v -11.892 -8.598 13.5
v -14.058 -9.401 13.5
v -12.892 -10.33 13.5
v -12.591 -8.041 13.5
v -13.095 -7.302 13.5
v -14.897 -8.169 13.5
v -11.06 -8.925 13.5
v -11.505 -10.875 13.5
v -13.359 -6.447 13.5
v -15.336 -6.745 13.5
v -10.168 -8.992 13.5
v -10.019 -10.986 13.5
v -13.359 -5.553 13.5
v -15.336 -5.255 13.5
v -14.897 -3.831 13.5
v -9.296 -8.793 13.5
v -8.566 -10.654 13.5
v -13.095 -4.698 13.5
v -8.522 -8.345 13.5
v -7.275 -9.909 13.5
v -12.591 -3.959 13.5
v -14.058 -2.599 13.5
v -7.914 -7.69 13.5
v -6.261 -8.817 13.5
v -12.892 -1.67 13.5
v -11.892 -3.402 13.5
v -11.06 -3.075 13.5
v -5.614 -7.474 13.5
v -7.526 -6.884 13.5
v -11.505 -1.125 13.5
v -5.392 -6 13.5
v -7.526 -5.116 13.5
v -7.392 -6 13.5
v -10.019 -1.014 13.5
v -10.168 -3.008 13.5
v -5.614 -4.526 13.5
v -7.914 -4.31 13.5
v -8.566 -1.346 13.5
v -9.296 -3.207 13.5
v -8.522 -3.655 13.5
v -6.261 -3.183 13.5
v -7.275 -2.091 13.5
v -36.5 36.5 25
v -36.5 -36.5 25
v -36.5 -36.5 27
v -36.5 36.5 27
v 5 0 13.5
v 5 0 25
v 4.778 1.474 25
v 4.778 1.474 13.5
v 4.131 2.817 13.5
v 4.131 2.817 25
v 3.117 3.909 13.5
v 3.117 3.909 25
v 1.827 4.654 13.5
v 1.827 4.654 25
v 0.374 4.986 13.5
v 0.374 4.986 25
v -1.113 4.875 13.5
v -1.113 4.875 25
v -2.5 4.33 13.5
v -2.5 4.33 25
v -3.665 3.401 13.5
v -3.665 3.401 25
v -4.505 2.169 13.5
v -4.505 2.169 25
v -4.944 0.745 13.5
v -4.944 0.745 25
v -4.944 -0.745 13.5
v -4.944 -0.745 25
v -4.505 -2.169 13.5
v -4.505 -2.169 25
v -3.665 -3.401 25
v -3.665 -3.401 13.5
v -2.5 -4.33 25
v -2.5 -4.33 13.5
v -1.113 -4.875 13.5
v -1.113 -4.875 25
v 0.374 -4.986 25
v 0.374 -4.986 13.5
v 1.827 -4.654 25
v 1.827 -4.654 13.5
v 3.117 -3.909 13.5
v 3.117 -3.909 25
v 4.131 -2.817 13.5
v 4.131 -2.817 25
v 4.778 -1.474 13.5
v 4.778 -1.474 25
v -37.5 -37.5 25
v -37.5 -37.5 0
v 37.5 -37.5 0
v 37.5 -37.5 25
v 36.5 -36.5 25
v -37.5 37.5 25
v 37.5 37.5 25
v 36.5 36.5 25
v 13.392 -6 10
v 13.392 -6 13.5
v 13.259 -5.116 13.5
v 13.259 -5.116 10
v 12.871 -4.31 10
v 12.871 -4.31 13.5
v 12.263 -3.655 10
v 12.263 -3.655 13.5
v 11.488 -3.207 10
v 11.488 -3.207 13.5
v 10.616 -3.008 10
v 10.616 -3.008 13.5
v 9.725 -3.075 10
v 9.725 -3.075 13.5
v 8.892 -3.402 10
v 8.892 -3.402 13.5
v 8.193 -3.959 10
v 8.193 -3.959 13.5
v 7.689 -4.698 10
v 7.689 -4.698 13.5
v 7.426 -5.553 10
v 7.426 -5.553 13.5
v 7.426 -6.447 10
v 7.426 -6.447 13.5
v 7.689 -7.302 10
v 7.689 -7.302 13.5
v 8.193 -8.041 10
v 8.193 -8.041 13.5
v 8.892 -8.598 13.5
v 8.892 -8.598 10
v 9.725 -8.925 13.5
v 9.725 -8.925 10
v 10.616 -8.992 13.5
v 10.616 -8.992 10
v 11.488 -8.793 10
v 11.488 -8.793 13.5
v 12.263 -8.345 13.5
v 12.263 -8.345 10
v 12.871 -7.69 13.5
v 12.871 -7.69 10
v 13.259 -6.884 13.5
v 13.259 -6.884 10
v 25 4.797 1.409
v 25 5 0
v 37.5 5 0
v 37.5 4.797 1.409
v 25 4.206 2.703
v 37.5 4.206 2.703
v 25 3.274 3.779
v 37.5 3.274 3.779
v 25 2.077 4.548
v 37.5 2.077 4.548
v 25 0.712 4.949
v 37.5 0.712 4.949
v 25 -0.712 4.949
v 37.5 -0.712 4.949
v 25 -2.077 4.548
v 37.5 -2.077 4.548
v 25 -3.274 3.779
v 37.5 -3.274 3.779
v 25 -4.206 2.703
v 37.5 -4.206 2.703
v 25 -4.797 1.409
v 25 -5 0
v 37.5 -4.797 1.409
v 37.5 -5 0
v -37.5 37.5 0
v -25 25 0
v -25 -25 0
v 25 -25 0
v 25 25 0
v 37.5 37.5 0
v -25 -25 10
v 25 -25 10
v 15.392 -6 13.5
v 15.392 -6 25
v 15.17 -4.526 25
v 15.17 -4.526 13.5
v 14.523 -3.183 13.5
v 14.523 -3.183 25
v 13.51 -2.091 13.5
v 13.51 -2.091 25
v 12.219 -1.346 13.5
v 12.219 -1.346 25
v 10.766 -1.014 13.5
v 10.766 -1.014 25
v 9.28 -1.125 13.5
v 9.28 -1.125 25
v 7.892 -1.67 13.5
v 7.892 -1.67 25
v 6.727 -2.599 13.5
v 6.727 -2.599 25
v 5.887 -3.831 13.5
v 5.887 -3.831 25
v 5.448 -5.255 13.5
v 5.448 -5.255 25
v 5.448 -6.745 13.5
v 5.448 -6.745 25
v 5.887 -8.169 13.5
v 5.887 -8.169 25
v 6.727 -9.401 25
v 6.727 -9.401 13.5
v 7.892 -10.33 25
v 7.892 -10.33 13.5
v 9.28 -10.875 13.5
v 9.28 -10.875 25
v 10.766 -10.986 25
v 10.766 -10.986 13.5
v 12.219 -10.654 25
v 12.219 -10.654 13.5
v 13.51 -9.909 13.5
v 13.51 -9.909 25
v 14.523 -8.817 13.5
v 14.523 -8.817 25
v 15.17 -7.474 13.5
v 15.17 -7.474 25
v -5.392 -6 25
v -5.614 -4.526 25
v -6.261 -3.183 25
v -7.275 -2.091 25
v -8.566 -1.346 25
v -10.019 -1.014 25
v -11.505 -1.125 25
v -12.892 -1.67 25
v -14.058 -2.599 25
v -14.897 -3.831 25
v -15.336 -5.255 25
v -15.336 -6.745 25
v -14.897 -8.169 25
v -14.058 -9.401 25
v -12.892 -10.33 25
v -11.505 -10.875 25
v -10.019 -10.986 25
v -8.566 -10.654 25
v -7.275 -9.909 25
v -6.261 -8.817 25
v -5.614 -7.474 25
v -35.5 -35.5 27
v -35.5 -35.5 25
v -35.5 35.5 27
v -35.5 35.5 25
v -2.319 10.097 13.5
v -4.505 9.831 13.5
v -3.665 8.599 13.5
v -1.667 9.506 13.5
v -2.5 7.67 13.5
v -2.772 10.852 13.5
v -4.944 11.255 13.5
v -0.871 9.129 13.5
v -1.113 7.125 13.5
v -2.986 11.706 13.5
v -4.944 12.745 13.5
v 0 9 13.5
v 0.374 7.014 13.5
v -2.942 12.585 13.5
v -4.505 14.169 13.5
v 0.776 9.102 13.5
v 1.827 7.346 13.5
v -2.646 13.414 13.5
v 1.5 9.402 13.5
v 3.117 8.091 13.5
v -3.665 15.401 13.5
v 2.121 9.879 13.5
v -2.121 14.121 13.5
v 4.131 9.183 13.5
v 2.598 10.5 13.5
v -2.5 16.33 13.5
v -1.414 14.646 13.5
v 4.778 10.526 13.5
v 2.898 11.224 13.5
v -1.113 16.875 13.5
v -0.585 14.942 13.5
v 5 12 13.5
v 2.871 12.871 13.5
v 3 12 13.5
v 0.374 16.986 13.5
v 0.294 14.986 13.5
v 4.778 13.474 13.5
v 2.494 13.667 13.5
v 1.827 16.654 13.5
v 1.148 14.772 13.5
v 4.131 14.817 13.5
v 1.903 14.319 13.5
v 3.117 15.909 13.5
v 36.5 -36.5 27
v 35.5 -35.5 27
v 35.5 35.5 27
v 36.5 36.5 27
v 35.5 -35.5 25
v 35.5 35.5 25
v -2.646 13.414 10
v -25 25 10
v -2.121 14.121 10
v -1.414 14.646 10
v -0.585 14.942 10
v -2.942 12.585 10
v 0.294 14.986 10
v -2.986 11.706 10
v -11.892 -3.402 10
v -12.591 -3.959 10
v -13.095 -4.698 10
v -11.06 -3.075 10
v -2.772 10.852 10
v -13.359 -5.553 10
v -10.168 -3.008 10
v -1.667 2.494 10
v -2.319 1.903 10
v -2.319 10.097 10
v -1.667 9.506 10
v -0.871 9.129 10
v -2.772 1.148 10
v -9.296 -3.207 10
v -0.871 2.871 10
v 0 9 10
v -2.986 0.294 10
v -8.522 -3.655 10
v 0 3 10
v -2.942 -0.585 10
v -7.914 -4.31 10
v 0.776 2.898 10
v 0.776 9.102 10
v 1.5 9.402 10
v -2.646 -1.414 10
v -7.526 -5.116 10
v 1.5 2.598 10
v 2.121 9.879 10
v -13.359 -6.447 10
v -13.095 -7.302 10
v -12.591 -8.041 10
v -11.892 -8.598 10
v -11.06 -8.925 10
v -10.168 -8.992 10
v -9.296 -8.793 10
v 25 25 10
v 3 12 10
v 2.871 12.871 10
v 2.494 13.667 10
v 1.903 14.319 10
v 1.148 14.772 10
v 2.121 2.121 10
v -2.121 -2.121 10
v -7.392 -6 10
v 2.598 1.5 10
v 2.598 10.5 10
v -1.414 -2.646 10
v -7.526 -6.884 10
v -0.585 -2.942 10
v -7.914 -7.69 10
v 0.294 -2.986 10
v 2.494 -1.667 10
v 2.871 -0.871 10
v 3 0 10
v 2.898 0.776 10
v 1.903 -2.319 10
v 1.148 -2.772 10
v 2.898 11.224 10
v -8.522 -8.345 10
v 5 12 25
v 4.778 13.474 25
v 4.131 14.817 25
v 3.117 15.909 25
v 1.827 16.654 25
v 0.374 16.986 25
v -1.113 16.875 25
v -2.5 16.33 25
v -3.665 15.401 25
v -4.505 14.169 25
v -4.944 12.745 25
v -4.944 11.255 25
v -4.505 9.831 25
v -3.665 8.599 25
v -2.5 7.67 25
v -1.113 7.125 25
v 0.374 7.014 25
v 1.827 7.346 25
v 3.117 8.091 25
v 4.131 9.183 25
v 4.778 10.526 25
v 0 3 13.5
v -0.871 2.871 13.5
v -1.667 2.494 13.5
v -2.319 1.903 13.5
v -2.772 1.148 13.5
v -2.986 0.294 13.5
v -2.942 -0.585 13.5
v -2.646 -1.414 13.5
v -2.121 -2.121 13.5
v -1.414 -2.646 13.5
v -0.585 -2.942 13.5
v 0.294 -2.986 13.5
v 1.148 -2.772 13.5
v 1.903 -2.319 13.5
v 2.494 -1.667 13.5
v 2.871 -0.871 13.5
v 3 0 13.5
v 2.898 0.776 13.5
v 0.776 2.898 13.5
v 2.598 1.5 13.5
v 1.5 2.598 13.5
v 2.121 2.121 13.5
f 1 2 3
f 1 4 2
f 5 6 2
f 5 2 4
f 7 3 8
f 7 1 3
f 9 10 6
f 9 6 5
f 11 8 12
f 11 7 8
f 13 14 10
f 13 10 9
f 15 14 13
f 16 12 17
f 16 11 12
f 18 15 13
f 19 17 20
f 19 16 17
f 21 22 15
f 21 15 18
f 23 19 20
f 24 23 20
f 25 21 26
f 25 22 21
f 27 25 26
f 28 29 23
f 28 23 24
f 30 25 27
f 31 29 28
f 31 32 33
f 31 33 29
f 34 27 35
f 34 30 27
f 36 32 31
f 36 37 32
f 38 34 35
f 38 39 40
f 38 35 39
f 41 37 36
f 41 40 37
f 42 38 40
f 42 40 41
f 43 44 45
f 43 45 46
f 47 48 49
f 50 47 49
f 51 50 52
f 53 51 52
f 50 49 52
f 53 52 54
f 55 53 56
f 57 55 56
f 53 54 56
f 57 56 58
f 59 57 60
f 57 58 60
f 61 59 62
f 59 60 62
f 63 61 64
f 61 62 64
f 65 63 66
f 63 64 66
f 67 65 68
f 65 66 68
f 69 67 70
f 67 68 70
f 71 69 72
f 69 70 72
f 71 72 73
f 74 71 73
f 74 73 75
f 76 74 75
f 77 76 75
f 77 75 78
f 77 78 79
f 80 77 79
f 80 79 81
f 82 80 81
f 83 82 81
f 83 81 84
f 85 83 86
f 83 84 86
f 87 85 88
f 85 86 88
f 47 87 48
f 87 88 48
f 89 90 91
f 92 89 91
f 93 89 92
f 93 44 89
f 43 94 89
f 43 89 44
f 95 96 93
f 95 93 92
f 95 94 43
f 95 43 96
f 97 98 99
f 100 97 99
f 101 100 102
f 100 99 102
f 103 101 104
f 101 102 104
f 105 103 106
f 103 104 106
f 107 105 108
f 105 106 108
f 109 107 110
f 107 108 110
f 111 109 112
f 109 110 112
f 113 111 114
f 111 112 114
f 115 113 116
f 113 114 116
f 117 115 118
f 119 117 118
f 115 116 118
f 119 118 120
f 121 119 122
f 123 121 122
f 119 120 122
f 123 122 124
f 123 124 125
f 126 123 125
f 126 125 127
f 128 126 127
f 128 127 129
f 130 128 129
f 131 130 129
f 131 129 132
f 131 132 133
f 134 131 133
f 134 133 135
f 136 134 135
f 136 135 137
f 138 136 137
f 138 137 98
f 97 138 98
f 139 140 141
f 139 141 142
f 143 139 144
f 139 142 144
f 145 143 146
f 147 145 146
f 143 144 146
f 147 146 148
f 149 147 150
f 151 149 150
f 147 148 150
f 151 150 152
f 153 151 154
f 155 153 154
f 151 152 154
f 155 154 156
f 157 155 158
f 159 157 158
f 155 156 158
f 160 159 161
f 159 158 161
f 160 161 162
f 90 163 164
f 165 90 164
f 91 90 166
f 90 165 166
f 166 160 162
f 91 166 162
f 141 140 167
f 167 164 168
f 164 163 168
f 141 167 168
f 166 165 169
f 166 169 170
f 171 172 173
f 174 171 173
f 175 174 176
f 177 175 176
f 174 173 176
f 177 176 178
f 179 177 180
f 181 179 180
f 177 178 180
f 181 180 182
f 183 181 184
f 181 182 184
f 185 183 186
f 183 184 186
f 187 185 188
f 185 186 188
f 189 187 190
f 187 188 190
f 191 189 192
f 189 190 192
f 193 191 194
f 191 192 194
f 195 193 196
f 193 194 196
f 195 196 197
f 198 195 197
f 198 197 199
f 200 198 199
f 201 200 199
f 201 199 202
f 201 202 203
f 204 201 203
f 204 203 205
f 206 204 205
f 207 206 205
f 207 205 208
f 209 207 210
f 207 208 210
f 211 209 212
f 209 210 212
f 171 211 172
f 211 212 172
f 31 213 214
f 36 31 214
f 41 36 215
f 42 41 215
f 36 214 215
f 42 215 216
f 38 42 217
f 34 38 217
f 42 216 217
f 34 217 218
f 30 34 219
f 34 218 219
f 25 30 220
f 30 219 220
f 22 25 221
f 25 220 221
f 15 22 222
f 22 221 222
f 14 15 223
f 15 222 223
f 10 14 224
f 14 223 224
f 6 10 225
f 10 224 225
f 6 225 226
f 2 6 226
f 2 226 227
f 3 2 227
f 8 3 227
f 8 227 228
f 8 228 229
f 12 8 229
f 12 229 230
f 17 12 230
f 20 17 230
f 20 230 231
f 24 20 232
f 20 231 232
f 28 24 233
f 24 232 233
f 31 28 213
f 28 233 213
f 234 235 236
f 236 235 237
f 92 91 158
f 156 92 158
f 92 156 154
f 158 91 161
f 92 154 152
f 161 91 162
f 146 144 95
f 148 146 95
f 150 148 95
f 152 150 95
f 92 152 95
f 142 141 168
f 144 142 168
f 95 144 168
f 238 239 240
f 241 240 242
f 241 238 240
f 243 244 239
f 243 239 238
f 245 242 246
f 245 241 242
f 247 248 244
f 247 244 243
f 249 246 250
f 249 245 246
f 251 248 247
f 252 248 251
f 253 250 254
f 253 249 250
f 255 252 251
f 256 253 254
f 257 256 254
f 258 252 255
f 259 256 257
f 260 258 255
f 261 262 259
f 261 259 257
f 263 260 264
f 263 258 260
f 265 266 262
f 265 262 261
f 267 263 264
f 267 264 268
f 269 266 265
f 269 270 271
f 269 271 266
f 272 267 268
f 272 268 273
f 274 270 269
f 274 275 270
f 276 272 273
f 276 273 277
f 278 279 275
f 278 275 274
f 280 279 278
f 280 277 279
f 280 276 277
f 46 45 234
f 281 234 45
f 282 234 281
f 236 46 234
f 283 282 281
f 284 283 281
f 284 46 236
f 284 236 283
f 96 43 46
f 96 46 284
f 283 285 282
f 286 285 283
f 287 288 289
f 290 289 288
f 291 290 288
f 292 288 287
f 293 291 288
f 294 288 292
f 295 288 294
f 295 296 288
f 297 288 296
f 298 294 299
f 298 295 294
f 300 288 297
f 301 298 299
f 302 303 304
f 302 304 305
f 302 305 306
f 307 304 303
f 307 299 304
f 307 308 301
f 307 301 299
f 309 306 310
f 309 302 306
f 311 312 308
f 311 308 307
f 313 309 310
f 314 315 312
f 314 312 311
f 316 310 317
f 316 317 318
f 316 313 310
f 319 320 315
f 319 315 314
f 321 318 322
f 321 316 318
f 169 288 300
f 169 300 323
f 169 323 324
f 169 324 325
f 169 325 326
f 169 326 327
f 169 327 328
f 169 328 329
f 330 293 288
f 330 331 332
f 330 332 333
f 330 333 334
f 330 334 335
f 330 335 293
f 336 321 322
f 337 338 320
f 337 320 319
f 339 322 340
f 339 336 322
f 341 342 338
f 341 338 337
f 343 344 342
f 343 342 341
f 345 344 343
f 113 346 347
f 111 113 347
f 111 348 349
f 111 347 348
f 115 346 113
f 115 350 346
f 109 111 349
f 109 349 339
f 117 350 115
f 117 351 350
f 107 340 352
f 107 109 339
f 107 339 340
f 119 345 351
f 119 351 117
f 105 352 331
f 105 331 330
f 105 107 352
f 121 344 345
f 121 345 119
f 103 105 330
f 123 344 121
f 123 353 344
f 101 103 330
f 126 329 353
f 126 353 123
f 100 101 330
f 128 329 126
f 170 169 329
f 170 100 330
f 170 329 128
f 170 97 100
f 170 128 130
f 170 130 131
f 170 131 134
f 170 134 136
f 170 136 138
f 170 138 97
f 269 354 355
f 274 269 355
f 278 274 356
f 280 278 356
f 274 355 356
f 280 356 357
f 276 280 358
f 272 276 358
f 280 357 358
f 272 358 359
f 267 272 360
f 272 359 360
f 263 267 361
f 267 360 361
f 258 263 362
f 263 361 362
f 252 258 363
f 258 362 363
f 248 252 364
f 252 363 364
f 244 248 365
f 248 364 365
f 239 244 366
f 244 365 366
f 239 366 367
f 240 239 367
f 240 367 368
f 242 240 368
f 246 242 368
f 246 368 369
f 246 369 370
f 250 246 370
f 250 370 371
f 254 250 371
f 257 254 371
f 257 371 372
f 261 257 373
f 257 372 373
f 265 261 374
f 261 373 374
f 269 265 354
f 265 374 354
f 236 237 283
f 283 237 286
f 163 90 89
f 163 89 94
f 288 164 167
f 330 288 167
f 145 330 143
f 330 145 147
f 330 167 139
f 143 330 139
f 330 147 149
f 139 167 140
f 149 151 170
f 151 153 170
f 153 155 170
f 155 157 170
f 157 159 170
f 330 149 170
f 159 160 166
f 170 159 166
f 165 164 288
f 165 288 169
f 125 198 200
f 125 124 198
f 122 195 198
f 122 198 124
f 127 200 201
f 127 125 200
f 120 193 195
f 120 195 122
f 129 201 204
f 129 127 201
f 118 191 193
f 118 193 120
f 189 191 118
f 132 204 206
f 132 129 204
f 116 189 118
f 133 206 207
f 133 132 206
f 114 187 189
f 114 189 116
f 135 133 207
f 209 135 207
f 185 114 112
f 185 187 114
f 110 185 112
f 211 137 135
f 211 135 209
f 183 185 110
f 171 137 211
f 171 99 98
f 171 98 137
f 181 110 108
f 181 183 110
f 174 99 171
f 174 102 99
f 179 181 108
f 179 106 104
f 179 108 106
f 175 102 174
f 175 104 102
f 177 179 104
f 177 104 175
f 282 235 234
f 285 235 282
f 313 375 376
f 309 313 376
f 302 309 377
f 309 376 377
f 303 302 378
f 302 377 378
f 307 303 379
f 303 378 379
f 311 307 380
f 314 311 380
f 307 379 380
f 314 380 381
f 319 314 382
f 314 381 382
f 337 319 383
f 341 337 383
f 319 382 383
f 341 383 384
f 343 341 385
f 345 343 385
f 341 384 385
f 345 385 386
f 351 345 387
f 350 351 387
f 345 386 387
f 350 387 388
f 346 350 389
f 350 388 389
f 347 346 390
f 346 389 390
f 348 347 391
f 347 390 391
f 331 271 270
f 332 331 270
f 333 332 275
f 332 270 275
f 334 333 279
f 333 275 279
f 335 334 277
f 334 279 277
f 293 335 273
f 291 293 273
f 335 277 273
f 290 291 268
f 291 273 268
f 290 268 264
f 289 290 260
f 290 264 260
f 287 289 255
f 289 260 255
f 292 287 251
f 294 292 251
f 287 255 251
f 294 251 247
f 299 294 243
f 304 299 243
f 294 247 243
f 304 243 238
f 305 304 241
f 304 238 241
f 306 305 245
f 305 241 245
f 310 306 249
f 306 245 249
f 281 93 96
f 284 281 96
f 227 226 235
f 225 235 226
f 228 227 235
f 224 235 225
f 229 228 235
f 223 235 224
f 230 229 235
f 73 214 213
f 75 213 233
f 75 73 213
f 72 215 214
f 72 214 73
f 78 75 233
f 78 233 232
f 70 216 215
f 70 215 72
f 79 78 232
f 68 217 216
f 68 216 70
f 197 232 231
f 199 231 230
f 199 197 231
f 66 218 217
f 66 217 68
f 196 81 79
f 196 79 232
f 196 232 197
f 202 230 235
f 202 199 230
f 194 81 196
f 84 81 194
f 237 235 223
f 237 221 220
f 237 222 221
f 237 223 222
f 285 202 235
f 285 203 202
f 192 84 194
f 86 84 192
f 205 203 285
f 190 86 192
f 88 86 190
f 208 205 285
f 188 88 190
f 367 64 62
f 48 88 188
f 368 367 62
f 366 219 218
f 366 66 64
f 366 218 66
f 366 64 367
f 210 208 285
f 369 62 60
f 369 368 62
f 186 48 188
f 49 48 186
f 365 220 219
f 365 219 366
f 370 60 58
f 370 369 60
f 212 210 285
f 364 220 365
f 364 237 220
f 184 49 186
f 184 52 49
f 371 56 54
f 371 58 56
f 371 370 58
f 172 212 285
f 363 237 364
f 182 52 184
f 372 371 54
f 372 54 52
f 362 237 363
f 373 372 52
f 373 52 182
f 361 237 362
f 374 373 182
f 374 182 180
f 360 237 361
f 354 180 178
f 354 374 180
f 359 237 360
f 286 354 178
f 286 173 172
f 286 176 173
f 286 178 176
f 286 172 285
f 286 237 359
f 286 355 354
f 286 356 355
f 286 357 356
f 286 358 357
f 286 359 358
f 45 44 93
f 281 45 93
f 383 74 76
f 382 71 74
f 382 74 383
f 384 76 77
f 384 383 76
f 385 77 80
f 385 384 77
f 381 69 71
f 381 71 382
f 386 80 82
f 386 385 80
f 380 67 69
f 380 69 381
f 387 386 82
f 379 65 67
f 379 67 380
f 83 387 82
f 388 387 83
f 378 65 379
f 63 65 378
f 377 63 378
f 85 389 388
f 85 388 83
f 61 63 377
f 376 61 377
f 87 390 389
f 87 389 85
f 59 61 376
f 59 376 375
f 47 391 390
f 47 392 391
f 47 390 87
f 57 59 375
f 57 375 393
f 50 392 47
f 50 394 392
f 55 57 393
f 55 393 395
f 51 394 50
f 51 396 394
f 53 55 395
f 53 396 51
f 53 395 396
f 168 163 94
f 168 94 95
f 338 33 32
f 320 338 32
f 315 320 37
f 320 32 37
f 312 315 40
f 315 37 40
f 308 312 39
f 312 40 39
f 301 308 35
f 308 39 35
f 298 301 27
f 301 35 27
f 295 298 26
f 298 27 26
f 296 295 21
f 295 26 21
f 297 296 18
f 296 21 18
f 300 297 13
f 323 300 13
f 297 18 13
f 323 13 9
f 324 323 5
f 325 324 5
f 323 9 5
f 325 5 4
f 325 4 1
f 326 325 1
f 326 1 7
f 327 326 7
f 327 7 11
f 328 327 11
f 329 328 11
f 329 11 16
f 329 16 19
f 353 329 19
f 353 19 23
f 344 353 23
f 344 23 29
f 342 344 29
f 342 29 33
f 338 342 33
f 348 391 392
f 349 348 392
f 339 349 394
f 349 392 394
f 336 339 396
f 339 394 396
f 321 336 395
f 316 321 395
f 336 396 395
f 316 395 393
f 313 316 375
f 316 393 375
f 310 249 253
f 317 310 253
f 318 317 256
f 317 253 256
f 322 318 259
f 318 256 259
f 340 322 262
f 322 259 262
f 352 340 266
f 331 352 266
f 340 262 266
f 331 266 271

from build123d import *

# Parameters (mm, degrees)
F0_W      = 75
F0_H      = 75
F1_DEPTH  = 25
F2_W      = 73
F2_H      = 73
F2_W_2    = 71
F2_H_2    = 71
F3_DEPTH  = 2
F4_R      = 3
F5_DEPTH  = 20
F6_R      = 5
F7_DEPTH  = 11.5
F8_W      = 50
F8_H      = 50
F9_DEPTH  = 10
F10_R     = 5
F11_DEPTH = 15


with BuildPart() as f1:
    # F0 (on Top) → F1 (new body)
    with BuildSketch(Plane.XY):
        Rectangle(F0_W, F0_H)
    extrude(amount=F1_DEPTH)

    # F2 (on face) → F3 (join)
    with BuildSketch(Plane.XY.offset(25)):
        Rectangle(F2_W, F2_H)
        Rectangle(F2_W_2, F2_H_2, mode=Mode.SUBTRACT)
    extrude(amount=F3_DEPTH)

    # F4 (on face) → F5 (cut)
    with BuildSketch(Plane.XY.offset(25)):
        with BuildLine():
            ThreePointArc((0, 3), (-2.12132, -2.12132), (3, 0))
            ThreePointArc((3, 0), (2.12132, 2.12132), (0, 3))
        make_face()
        with BuildLine():
            ThreePointArc((3, 12), (-2.12132, 14.12132), (0, 9))
            ThreePointArc((0, 9), (2.12132, 9.87868), (3, 12))
        make_face()
        with Locations((-10.392305, -6)):
            Circle(F4_R)
        with Locations((10.392305, -6)):
            Circle(F4_R)
    extrude(amount=-F5_DEPTH, mode=Mode.SUBTRACT)

    # F6 (on face) → F7 (cut)
    with BuildSketch(Plane.XY.offset(25)):
        Circle(F6_R)
        with Locations((0, 12)):
            Circle(F6_R)
        with Locations((-10.392305, -6)):
            Circle(F6_R)
        with Locations((10.392305, -6)):
            Circle(F6_R)
    extrude(amount=-F7_DEPTH, mode=Mode.SUBTRACT)

    # F8 (on face) → F9 (cut)
    with BuildSketch(Plane(origin=(0, 0, 0), x_dir=(1, 0, 0), z_dir=(0, 0, -1))):
        Rectangle(F8_W, F8_H)
    extrude(amount=-F9_DEPTH, mode=Mode.SUBTRACT)

    # F10 (on face) → F11 (cut)
    with BuildSketch(Plane.YZ.offset(37.5)):
        Circle(F10_R)
    extrude(amount=-F11_DEPTH, mode=Mode.SUBTRACT)


solid = f1.part
